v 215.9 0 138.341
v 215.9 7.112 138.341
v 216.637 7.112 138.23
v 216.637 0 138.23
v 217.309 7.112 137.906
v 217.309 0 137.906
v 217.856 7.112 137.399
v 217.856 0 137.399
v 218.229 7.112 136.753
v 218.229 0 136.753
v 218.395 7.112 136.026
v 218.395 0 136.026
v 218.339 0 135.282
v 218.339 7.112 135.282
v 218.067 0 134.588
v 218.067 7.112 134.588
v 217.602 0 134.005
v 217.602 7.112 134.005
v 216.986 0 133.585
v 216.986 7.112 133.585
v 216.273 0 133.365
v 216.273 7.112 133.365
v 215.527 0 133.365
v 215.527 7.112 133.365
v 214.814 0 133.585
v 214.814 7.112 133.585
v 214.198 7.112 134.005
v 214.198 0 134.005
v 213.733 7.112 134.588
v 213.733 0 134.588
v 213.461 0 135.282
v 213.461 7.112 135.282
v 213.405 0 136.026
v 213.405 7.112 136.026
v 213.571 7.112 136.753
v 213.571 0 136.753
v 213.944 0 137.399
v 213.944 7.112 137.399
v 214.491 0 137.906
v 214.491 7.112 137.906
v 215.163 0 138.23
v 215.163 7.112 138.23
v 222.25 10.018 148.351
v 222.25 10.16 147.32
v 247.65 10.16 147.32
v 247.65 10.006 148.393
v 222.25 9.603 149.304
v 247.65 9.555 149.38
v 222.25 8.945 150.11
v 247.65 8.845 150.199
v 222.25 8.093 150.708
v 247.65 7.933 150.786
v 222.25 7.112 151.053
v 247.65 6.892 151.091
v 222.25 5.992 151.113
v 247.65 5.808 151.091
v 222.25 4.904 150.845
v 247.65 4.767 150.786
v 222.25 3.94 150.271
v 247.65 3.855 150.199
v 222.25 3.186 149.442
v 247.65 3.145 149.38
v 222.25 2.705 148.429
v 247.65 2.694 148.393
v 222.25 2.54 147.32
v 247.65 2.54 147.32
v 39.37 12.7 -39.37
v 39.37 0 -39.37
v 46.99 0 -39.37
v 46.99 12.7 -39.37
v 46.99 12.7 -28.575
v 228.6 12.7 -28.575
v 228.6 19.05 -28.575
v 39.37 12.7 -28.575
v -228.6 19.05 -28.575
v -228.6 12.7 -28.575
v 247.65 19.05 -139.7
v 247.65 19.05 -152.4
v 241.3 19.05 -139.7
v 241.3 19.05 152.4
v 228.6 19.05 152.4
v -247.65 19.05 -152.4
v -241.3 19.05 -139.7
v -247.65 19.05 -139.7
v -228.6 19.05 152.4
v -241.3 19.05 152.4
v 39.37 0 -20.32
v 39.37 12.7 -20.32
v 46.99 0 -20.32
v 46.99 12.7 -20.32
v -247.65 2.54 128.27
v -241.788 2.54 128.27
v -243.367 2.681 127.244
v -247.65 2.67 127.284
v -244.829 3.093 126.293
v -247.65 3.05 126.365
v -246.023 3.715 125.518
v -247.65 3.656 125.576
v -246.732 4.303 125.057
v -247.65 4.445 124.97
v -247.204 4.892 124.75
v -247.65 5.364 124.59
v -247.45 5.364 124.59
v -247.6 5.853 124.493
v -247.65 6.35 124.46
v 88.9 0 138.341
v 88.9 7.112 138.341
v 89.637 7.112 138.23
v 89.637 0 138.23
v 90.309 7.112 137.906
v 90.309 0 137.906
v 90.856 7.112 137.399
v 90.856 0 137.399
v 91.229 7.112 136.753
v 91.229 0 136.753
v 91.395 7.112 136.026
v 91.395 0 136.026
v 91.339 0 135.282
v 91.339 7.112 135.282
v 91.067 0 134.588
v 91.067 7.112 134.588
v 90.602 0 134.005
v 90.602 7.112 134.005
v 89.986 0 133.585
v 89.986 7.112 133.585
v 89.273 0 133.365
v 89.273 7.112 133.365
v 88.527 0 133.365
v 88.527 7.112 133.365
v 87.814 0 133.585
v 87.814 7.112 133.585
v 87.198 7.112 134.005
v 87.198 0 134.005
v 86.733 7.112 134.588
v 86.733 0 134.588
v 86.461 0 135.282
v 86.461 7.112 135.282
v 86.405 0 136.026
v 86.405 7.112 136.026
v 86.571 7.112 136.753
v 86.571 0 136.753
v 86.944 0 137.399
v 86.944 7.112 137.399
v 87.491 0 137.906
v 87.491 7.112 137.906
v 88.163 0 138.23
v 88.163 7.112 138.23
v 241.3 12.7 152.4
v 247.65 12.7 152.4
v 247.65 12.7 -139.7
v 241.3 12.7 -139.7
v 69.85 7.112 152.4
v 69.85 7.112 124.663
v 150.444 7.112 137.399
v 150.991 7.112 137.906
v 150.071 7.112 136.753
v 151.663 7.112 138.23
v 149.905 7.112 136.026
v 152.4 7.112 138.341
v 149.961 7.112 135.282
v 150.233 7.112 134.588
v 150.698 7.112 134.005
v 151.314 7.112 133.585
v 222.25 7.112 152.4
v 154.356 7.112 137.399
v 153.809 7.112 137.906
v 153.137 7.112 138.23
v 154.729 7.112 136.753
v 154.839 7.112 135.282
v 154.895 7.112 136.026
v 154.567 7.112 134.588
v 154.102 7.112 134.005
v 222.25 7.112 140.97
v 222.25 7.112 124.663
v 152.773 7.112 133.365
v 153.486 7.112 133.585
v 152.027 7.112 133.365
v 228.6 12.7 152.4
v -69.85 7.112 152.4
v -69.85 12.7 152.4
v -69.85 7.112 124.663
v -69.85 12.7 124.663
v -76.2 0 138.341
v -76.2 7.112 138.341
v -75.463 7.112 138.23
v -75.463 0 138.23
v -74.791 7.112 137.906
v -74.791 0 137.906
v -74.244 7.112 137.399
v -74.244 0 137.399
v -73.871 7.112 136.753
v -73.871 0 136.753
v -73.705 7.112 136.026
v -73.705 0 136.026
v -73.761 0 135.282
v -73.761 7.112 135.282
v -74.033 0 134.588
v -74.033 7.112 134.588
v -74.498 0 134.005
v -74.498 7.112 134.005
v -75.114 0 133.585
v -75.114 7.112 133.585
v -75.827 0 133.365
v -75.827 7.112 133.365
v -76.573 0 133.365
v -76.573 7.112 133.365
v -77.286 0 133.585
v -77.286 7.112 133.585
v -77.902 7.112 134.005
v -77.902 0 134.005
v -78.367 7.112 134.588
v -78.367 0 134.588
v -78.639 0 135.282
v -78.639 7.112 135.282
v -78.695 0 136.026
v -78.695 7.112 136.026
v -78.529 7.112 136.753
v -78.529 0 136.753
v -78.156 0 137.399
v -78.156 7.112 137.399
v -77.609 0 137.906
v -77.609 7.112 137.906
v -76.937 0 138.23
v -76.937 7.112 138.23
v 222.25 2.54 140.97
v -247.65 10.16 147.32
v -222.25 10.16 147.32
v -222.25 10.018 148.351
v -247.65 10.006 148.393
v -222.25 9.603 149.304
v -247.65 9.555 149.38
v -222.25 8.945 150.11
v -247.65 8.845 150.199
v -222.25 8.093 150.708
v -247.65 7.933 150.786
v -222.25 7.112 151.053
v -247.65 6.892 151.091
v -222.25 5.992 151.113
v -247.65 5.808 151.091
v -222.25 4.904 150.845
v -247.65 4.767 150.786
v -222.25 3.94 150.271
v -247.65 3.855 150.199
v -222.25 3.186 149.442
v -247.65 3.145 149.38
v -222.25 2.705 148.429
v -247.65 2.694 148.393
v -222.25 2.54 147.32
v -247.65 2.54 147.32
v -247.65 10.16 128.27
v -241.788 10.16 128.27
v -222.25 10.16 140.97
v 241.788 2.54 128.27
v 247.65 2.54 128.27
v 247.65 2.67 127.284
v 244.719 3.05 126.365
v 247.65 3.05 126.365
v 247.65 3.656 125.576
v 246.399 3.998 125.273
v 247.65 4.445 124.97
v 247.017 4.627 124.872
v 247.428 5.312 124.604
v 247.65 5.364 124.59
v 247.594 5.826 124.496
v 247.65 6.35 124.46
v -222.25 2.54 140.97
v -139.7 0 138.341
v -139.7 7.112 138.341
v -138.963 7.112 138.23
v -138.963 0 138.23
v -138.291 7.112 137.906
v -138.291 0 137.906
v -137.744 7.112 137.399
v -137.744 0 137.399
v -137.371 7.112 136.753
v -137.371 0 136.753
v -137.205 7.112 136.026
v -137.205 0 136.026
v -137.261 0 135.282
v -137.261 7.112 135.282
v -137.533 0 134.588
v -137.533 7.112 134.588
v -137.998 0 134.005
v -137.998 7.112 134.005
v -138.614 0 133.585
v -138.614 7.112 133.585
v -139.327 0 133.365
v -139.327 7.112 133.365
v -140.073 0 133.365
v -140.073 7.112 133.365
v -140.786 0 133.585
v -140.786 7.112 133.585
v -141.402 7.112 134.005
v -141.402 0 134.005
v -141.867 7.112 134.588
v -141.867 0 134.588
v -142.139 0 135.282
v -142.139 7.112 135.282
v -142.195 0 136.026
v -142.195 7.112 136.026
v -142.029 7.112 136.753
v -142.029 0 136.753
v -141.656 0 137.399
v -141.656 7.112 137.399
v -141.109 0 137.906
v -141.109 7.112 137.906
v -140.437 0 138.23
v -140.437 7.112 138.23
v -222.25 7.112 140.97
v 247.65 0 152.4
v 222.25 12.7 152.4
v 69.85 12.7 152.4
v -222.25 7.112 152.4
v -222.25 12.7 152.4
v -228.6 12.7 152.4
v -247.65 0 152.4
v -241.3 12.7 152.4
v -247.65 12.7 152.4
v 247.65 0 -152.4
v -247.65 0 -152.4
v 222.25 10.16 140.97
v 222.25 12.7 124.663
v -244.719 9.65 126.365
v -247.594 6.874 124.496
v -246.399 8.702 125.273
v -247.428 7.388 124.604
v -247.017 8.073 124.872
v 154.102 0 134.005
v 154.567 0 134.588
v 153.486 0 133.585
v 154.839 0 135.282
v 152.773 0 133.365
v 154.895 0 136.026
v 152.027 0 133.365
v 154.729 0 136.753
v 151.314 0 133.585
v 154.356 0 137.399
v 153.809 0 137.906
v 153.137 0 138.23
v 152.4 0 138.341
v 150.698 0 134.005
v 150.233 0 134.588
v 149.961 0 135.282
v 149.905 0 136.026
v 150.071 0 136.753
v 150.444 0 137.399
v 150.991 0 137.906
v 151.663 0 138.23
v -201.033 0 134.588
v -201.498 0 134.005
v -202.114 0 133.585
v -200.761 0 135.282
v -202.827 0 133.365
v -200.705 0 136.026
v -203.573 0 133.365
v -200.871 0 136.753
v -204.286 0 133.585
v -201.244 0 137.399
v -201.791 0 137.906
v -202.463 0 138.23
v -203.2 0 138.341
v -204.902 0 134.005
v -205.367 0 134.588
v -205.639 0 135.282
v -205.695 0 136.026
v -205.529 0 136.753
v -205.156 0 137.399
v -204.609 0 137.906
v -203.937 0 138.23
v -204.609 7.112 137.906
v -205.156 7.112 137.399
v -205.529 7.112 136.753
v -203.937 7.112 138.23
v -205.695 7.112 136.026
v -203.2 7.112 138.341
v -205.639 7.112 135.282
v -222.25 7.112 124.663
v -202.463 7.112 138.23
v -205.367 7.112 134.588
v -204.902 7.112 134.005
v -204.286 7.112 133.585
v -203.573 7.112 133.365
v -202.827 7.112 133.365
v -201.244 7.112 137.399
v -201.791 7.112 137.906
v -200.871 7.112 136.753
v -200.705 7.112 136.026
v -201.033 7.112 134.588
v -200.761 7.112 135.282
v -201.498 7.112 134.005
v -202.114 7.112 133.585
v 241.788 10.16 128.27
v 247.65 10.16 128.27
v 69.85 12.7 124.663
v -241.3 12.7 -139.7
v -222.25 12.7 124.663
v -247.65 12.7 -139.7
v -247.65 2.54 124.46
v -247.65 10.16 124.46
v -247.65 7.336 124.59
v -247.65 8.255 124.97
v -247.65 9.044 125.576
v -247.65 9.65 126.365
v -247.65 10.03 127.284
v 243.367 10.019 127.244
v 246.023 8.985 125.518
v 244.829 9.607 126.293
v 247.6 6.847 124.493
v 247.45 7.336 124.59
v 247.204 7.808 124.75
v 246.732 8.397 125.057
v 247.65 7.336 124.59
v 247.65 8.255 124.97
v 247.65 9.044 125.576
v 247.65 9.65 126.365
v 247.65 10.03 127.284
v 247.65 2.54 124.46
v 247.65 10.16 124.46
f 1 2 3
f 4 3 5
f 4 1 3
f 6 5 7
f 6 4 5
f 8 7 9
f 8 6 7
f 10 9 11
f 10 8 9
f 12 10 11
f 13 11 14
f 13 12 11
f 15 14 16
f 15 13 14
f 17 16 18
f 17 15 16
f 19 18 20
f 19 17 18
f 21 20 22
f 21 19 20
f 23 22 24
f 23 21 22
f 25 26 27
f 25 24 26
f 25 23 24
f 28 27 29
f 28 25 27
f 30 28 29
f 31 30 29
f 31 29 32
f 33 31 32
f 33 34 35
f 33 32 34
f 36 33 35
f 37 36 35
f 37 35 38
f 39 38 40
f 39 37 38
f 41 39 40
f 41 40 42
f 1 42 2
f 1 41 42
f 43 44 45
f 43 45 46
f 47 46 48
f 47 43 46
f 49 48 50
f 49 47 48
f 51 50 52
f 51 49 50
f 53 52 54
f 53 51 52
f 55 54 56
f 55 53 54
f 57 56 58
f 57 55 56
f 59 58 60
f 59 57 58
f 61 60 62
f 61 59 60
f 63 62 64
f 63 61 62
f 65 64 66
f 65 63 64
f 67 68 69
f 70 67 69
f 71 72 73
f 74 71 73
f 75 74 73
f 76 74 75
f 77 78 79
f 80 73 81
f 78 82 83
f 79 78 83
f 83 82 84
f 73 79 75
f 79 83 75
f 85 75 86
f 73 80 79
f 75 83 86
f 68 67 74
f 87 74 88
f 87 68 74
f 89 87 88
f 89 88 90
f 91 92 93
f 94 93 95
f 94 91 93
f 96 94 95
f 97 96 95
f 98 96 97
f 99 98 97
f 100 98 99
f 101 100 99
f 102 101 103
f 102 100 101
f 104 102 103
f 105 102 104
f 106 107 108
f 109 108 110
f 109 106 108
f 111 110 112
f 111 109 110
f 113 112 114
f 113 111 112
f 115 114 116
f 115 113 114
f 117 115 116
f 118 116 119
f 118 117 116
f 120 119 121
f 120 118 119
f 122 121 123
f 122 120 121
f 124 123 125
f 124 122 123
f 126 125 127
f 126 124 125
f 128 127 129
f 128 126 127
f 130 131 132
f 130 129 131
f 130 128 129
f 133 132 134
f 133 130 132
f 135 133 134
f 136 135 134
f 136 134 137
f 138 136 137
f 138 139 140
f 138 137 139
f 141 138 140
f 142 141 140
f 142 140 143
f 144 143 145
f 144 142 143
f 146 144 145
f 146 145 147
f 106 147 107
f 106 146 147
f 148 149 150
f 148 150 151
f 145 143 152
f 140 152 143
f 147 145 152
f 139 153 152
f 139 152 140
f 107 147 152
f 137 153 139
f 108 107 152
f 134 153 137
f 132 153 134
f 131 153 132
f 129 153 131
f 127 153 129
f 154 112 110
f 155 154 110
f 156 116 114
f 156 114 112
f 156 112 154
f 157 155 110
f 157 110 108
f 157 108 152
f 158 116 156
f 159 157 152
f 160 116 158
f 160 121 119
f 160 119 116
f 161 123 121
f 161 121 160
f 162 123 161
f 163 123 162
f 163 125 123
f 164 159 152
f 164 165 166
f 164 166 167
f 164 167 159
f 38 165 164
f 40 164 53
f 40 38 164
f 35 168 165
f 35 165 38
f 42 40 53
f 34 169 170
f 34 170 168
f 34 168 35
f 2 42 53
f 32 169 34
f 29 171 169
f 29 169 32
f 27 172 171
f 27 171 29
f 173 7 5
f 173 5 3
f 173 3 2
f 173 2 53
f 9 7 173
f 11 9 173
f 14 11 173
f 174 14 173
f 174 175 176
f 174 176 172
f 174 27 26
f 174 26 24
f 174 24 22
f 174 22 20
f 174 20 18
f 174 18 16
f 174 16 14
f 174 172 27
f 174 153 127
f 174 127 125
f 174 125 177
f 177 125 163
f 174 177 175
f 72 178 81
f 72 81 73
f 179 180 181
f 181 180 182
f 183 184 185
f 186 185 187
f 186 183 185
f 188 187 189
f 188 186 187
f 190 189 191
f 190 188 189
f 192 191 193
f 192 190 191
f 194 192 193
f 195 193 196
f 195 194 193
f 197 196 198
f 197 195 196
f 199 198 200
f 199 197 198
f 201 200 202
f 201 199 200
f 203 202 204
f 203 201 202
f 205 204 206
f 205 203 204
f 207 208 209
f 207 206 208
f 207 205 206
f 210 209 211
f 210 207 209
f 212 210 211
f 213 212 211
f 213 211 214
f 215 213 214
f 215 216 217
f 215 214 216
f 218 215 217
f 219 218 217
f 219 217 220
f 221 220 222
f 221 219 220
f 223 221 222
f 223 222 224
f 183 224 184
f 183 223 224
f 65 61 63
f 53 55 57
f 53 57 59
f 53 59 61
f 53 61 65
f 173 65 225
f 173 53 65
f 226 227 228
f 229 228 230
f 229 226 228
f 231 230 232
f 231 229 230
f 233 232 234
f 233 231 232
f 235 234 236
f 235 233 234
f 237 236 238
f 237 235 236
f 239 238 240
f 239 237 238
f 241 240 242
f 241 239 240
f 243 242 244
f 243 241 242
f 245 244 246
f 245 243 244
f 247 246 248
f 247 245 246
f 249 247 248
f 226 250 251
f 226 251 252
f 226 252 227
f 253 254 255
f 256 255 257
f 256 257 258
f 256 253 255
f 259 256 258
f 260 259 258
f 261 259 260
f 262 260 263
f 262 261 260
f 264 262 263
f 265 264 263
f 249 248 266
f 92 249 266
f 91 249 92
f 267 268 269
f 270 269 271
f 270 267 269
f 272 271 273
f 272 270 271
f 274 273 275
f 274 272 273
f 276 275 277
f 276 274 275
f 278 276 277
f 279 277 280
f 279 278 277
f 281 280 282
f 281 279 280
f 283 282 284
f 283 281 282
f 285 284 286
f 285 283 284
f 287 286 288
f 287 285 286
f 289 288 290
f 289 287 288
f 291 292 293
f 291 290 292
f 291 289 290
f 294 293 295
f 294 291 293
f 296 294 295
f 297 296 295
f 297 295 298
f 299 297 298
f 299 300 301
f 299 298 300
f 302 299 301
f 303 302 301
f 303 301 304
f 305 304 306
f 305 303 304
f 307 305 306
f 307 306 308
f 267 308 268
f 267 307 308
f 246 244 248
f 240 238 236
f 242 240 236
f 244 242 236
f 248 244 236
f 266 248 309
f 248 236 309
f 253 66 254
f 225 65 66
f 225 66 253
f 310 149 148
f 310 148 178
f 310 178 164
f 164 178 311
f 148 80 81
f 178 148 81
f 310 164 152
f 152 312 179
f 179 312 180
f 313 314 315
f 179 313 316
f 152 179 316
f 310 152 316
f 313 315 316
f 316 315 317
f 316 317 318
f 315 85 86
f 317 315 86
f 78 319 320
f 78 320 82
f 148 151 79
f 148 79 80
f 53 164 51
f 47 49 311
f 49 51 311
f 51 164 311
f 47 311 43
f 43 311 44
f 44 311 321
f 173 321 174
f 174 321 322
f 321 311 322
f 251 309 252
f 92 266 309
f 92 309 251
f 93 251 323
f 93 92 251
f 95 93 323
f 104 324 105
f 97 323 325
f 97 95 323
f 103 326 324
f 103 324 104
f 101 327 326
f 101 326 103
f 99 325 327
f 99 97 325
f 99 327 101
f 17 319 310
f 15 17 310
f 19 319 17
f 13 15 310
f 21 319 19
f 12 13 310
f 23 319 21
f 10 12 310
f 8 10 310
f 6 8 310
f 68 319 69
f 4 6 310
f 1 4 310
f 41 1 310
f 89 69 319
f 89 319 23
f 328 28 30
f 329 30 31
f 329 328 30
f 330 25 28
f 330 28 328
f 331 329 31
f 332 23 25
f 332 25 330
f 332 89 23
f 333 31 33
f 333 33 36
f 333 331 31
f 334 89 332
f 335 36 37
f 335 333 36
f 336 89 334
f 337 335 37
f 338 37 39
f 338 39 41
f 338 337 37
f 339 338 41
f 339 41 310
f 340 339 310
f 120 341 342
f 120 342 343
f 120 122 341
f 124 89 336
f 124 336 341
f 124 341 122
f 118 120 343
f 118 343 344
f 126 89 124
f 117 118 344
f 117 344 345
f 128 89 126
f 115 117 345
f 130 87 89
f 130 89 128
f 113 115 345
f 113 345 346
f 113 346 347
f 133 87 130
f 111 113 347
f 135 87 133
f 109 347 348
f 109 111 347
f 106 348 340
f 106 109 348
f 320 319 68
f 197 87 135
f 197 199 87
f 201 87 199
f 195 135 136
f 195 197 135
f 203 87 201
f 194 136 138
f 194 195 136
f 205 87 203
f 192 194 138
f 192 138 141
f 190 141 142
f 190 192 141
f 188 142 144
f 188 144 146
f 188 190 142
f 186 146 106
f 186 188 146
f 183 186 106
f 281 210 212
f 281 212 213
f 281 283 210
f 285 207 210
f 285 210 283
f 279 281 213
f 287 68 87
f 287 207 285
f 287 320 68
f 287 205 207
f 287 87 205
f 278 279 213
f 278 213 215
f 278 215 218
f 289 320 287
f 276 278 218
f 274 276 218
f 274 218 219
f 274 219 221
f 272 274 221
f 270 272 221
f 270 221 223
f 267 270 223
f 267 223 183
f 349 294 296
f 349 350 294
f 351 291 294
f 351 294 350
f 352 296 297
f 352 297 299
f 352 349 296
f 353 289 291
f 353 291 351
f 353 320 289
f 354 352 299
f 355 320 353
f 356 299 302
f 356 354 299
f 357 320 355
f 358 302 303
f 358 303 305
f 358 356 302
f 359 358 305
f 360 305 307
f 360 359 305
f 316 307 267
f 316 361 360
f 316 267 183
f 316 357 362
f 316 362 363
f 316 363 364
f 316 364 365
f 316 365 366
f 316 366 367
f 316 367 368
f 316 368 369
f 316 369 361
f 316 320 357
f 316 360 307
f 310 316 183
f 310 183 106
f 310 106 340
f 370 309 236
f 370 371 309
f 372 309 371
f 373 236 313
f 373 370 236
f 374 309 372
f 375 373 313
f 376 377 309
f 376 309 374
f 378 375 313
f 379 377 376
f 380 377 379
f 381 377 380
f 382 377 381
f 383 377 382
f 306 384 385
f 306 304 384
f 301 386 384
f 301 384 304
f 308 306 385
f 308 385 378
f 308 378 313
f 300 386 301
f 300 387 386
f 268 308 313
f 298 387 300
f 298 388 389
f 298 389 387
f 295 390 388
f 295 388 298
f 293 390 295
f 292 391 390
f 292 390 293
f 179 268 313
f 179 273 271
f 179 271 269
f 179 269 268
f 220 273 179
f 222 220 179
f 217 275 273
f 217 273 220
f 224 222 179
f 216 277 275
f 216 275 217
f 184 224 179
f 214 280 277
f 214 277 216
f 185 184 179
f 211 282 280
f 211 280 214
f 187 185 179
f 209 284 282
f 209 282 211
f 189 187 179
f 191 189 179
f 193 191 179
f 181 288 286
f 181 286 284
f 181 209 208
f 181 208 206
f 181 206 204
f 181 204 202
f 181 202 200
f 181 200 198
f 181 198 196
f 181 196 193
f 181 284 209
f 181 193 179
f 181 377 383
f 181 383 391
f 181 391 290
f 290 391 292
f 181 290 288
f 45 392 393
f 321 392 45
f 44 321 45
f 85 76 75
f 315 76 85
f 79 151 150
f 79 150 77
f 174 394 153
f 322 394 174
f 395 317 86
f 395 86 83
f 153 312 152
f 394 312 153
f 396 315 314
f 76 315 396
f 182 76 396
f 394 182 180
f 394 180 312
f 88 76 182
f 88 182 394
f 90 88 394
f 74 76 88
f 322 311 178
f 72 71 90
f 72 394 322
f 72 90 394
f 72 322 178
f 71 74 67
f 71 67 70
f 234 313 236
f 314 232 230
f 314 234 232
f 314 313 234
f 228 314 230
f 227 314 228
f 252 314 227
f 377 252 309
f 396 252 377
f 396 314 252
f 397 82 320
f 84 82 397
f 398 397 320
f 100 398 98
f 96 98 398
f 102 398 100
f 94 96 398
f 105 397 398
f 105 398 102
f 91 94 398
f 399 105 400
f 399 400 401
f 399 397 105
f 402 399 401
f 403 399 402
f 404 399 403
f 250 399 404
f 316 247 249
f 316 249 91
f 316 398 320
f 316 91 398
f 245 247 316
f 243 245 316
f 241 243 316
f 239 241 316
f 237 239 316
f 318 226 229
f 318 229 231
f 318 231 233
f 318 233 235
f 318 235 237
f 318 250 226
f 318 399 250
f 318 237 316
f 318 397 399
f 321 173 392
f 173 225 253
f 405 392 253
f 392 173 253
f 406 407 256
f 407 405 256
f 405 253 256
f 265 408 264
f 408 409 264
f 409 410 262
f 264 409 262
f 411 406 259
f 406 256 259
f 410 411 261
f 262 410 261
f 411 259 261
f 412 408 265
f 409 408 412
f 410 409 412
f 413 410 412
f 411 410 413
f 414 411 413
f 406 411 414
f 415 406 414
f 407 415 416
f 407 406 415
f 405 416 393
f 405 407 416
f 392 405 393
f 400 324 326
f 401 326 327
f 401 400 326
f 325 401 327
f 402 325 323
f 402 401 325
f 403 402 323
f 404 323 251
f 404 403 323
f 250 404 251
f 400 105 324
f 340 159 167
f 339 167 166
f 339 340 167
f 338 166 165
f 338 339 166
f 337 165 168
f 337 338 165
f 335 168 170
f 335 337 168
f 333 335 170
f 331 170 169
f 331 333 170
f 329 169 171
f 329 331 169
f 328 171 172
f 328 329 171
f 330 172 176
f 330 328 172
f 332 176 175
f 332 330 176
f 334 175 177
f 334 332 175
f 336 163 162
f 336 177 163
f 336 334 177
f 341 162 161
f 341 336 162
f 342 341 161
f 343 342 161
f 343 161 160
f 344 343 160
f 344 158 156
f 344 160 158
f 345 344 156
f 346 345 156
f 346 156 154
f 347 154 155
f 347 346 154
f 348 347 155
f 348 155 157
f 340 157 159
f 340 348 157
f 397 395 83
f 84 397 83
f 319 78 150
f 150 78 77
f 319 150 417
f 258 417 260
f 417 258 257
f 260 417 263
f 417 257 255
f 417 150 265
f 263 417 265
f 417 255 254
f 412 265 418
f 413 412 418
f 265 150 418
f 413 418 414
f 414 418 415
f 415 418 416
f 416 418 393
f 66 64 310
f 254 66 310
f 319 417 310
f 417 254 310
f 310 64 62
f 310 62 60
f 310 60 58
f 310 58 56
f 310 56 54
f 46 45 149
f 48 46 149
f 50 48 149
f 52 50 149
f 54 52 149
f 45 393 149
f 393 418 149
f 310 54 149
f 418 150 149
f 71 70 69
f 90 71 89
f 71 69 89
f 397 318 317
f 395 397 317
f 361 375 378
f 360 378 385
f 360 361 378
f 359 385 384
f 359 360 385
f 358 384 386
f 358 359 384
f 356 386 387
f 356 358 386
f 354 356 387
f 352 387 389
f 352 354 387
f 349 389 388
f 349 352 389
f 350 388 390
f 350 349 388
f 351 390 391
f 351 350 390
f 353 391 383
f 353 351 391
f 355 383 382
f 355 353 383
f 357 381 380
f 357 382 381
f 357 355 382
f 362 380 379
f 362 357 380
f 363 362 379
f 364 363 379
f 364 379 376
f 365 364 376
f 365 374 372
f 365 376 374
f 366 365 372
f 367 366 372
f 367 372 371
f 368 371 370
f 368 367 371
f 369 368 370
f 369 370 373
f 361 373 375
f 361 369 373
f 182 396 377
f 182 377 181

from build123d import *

# Parameters (mm, degrees)
SKETCH1_W           = 482.6
SKETCH1_H           = 304.8
SKETCH1_R           = 2.5019
BOSS_EXTRUDE1_DEPTH = 12.7
BOSS_EXTRUDE2_DEPTH = 6.35
SKETCH4_W           = 6.35
SKETCH4_H           = 12.7
BOSS_EXTRUDE3_DEPTH = 292.1
SKETCH5_W           = 12.7
SKETCH5_H           = 19.05
BOSS_EXTRUDE4_DEPTH = 6.35
CUT_EXTRUDE2_START  = 6.35
CUT_EXTRUDE2_DEPTH  = 25.4
CUT_EXTRUDE3_START  = -463.55
CUT_EXTRUDE3_DEPTH  = 25.4
BOSS_EXTRUDE5_START = -2.54
BOSS_EXTRUDE5_DEPTH = 7.62
SKETCH13_W          = 152.4
SKETCH13_H          = 27.7368
CUT_EXTRUDE4_DEPTH  = 5.588
SKETCH14_W          = 7.62
SKETCH14_H          = 19.05
CUT_EXTRUDE5_DEPTH  = 12.7


with BuildPart() as part:
    # Sketch1 → Boss-Extrude1 (new body)
    with BuildSketch(Plane(origin=(0, 0, 0), x_dir=(1, 0, 0), z_dir=(0, 1, 0))):
        Rectangle(SKETCH1_W, SKETCH1_H)
        with Locations(Location((-203.2, -135.8392, 0), (0, 0, 270))):
            Circle(SKETCH1_R, mode=Mode.SUBTRACT)
        with Locations(Location((-139.7, -135.8392, 0), (0, 0, 270))):
            Circle(SKETCH1_R, mode=Mode.SUBTRACT)
        with Locations(Location((-76.2, -135.8392, 0), (0, 0, 270))):
            Circle(SKETCH1_R, mode=Mode.SUBTRACT)
        with Locations(Location((88.9, -135.8392, 0), (0, 0, 270))):
            Circle(SKETCH1_R, mode=Mode.SUBTRACT)
        with Locations(Location((152.4, -135.8392, 0), (0, 0, 270))):
            Circle(SKETCH1_R, mode=Mode.SUBTRACT)
        with Locations(Location((215.9, -135.8392, 0), (0, 0, 270))):
            Circle(SKETCH1_R, mode=Mode.SUBTRACT)
    extrude(amount=BOSS_EXTRUDE1_DEPTH)

    # Sketch2 → Boss-Extrude2 (add)
    with BuildSketch(Plane(origin=(0, 12.7, 0), x_dir=(1, 0, 0), z_dir=(0, 1, 0))):
        Polygon((-241.3, 152.4), (-228.6, 152.4), (228.6, 152.4), (241.3, 152.4), (241.3, -152.4), (228.6, -152.4), (228.6, 28.575), (-228.6, 28.575), (-228.6, -152.4), (-241.3, -152.4), align=None)
    extrude(amount=BOSS_EXTRUDE2_DEPTH)

    # Sketch4 → Boss-Extrude3 (add)
    with BuildSketch(Plane.XY.offset(152.4)):
        with Locations((-244.475, 6.35)):
            Rectangle(SKETCH4_W, SKETCH4_H)
    boss_extrude3 = extrude(amount=-BOSS_EXTRUDE3_DEPTH)

    # Sketch5 → Boss-Extrude4 (add)
    with BuildSketch(Plane.ZY.offset(241.3)):
        with Locations((-146.05, 9.525)):
            Rectangle(SKETCH5_W, SKETCH5_H)
    boss_extrude4 = extrude(amount=BOSS_EXTRUDE4_DEPTH)

    # Mirror1: Boss-Extrude3, Boss-Extrude4 across plane
    add(boss_extrude3.mirror(Plane(origin=(0, 0, 0), x_dir=(0, 0, 1), z_dir=(1, 0, 0))))
    add(boss_extrude4.mirror(Plane(origin=(0, 0, 0), x_dir=(0, 0, 1), z_dir=(1, 0, 0))))

    # Sketch6 → Cut-Extrude2 (cut)
    with BuildSketch(Plane.ZY.offset(241.3).offset(CUT_EXTRUDE2_START)):
        with BuildLine():
            Line((147.32, 2.54), (128.27, 2.54))
            ThreePointArc((128.27, 2.54), (124.46, 6.35), (128.27, 10.16))
            Line((128.27, 10.16), (147.32, 10.16))
            ThreePointArc((147.32, 10.16), (151.13, 6.35), (147.32, 2.54))
        make_face()
    extrude(amount=-CUT_EXTRUDE2_DEPTH, mode=Mode.SUBTRACT)

    # Sketch6<2> → Cut-Extrude3 (cut)
    with BuildSketch(Plane.ZY.offset(241.3).offset(CUT_EXTRUDE3_START)):
        with BuildLine():
            Line((147.32, 2.54), (128.27, 2.54))
            ThreePointArc((128.27, 2.54), (124.46, 6.35), (128.27, 10.16))
            Line((128.27, 10.16), (147.32, 10.16))
            ThreePointArc((147.32, 10.16), (151.13, 6.35), (147.32, 2.54))
        make_face()
    extrude(amount=-CUT_EXTRUDE3_DEPTH, mode=Mode.SUBTRACT)

    # Sketch11 → Boss-Extrude5 (add)
    with BuildSketch(Plane.XZ.offset(BOSS_EXTRUDE5_START)):
        Polygon((-247.65, 124.46), (-222.25, 124.46), (-222.25, 140.97), align=None)
    boss_extrude5 = extrude(amount=-BOSS_EXTRUDE5_DEPTH)

    # Mirror2: Boss-Extrude5 across plane
    add(boss_extrude5.mirror(Plane(origin=(0, 0, 0), x_dir=(0, 0, 1), z_dir=(1, 0, 0))))

    # Sketch13 → Cut-Extrude4 (cut)
    with BuildSketch(Plane(origin=(0, 12.7, 0), x_dir=(1, 0, 0), z_dir=(0, 1, 0))):
        with Locations((146.05, -138.5316)):
            Rectangle(SKETCH13_W, SKETCH13_H)
        with Locations((-146.05, -138.5316)):
            Rectangle(SKETCH13_W, SKETCH13_H)
    extrude(amount=-CUT_EXTRUDE4_DEPTH, mode=Mode.SUBTRACT)

    # Sketch14 → Cut-Extrude5 (cut)
    with BuildSketch(Plane.XZ):
        with Locations((43.18, -29.845)):
            Rectangle(SKETCH14_W, SKETCH14_H)
    extrude(amount=-CUT_EXTRUDE5_DEPTH, mode=Mode.SUBTRACT)


solid = part.part
